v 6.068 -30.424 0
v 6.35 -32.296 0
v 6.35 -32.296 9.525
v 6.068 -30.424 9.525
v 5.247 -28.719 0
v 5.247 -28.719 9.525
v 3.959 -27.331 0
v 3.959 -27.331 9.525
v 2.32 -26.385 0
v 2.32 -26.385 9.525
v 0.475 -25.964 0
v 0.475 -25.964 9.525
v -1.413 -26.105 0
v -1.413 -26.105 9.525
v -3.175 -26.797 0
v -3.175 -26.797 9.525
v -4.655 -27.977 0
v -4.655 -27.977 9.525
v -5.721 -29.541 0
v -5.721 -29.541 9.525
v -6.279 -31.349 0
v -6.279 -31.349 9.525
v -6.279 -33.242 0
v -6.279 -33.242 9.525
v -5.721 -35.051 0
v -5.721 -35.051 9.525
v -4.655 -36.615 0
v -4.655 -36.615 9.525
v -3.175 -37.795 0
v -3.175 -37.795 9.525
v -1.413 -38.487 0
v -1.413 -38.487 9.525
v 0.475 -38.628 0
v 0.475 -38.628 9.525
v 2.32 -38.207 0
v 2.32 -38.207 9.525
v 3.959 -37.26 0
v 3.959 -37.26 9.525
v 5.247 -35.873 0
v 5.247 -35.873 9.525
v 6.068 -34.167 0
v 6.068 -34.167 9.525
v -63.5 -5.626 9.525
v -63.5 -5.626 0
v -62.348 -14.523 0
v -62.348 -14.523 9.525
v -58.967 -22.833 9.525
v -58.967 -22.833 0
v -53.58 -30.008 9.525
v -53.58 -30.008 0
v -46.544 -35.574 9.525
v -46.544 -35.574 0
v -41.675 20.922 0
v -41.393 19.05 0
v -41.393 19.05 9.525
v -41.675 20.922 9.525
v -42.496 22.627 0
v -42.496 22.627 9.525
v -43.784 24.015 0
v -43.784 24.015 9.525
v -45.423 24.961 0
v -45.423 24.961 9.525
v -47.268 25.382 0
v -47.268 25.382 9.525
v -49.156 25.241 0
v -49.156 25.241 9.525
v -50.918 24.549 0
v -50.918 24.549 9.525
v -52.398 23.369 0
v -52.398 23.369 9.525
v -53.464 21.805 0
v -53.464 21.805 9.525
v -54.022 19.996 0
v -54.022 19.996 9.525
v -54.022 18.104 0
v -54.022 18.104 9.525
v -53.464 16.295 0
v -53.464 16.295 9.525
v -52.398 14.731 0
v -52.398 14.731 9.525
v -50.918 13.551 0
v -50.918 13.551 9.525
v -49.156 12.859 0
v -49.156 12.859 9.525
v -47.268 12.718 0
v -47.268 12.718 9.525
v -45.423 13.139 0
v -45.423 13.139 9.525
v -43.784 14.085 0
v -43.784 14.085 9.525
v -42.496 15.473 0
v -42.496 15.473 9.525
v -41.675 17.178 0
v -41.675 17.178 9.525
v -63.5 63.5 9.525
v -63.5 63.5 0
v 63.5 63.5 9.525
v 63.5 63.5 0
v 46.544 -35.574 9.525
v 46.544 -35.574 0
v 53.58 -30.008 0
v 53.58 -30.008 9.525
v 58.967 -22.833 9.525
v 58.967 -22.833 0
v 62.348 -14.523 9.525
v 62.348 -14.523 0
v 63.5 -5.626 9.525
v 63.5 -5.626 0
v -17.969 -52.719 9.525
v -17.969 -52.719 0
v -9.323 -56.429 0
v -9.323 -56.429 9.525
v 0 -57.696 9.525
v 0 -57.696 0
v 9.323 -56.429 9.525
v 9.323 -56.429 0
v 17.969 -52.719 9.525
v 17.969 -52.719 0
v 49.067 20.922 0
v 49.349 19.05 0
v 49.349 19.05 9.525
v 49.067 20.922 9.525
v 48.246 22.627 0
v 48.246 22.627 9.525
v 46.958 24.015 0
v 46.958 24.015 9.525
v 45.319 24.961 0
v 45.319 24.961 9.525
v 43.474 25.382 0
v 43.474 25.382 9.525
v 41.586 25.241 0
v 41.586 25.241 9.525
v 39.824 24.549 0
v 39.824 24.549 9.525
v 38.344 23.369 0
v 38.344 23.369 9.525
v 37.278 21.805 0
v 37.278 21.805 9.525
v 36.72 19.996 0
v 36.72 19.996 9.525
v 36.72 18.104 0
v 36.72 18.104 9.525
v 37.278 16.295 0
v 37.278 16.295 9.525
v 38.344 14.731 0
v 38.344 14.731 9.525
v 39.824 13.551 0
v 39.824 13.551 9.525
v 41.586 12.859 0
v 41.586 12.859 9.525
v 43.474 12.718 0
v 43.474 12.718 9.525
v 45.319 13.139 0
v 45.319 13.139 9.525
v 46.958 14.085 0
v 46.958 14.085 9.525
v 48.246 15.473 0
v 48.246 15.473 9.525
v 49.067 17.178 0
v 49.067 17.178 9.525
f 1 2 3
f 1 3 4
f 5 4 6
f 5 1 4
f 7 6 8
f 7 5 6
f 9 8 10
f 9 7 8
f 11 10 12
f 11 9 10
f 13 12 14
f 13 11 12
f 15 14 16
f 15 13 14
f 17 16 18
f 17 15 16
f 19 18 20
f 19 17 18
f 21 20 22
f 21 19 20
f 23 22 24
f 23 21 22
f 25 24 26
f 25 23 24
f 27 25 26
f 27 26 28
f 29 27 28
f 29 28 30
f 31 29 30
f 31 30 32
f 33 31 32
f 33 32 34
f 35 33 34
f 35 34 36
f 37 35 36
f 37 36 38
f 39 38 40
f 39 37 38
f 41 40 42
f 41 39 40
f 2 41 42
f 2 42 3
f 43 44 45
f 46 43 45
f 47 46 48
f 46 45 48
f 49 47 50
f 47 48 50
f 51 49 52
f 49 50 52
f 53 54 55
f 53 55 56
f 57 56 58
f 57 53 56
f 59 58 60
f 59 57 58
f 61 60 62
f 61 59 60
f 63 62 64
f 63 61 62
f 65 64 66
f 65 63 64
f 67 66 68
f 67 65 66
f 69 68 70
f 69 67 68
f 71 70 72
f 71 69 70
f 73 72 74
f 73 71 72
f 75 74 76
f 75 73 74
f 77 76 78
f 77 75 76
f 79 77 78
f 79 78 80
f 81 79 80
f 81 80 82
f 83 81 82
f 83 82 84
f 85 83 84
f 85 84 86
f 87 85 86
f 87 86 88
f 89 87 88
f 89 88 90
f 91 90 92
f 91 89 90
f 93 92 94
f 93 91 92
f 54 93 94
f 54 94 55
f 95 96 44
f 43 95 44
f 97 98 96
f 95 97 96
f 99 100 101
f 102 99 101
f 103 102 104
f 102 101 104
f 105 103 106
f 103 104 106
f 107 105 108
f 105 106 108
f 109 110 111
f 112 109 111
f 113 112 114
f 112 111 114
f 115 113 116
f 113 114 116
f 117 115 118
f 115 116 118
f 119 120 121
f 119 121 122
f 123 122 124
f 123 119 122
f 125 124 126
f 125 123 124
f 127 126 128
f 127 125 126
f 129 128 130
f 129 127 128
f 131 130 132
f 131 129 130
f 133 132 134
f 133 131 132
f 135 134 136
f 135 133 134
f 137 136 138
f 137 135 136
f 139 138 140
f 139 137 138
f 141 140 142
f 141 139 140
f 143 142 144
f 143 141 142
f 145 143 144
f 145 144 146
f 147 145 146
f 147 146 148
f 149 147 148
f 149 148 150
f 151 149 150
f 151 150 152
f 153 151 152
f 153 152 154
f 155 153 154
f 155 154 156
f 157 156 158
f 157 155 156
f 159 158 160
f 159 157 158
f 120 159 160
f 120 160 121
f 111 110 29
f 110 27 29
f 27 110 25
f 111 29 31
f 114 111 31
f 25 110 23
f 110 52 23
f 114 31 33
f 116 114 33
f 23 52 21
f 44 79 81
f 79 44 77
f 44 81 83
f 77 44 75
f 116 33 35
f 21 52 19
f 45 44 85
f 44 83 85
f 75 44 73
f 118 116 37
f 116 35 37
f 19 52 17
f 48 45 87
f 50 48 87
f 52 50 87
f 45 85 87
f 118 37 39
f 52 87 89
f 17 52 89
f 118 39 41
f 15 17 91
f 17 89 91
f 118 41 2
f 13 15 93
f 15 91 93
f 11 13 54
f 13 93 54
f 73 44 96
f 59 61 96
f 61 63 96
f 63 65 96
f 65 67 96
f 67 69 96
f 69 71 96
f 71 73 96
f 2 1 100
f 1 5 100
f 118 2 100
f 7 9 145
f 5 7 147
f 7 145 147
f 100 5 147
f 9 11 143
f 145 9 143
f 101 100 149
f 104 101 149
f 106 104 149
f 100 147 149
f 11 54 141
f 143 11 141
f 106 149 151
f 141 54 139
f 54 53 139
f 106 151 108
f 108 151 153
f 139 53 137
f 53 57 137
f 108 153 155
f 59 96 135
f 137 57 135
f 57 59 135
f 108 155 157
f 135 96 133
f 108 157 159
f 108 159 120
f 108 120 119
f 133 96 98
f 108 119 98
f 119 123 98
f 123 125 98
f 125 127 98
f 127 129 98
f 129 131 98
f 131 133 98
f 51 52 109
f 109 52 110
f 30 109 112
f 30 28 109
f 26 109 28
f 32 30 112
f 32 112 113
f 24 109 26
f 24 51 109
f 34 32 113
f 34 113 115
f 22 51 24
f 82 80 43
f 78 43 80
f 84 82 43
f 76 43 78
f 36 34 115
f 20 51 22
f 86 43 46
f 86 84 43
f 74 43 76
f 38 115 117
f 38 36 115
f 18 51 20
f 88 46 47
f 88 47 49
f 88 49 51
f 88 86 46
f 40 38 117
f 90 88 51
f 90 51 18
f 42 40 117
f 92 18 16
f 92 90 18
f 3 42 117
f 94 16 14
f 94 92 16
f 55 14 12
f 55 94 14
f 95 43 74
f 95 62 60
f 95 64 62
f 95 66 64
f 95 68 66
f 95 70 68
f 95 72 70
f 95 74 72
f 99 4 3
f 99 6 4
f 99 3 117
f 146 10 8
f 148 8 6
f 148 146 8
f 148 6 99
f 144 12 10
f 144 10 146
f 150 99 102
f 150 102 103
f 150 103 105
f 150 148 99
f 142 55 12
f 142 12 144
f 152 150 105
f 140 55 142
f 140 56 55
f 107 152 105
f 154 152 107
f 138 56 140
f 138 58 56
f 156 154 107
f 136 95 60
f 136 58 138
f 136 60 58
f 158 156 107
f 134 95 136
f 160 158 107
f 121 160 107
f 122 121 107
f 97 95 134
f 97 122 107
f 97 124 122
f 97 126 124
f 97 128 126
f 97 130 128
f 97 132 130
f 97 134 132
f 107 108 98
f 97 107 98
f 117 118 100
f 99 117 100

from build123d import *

# Parameters (mm, degrees)
F0_R     = 6.35
F1_DEPTH = 9.525


with BuildPart() as f1:
    # F0 (on Top) → F1 (new body)
    with BuildSketch(Plane.XY):
        with BuildLine():
            Line((63.5, 63.5), (-63.5, 63.5))
            Line((-63.5, 63.5), (-63.5, -5.625801))
            ThreePointArc((-63.5, -5.625801), (-58.966732, -22.833307), (-46.543764, -35.573741))
            Line((-46.543764, -35.573741), (-17.968764, -52.718741))
            ThreePointArc((-17.968764, -52.718741), (0, -57.695801), (17.968764, -52.718741))
            Line((17.968764, -52.718741), (46.543764, -35.573741))
            ThreePointArc((46.543764, -35.573741), (58.966732, -22.833307), (63.5, -5.625801))
            Line((63.5, -5.625801), (63.5, 63.5))
        make_face()
        with Locations((0, -32.295801)):
            Circle(F0_R, mode=Mode.SUBTRACT)
        with Locations((-47.742878, 19.05)):
            Circle(F0_R, mode=Mode.SUBTRACT)
        with Locations((42.999213, 19.05)):
            Circle(F0_R, mode=Mode.SUBTRACT)
    extrude(amount=F1_DEPTH)


solid = f1.part
